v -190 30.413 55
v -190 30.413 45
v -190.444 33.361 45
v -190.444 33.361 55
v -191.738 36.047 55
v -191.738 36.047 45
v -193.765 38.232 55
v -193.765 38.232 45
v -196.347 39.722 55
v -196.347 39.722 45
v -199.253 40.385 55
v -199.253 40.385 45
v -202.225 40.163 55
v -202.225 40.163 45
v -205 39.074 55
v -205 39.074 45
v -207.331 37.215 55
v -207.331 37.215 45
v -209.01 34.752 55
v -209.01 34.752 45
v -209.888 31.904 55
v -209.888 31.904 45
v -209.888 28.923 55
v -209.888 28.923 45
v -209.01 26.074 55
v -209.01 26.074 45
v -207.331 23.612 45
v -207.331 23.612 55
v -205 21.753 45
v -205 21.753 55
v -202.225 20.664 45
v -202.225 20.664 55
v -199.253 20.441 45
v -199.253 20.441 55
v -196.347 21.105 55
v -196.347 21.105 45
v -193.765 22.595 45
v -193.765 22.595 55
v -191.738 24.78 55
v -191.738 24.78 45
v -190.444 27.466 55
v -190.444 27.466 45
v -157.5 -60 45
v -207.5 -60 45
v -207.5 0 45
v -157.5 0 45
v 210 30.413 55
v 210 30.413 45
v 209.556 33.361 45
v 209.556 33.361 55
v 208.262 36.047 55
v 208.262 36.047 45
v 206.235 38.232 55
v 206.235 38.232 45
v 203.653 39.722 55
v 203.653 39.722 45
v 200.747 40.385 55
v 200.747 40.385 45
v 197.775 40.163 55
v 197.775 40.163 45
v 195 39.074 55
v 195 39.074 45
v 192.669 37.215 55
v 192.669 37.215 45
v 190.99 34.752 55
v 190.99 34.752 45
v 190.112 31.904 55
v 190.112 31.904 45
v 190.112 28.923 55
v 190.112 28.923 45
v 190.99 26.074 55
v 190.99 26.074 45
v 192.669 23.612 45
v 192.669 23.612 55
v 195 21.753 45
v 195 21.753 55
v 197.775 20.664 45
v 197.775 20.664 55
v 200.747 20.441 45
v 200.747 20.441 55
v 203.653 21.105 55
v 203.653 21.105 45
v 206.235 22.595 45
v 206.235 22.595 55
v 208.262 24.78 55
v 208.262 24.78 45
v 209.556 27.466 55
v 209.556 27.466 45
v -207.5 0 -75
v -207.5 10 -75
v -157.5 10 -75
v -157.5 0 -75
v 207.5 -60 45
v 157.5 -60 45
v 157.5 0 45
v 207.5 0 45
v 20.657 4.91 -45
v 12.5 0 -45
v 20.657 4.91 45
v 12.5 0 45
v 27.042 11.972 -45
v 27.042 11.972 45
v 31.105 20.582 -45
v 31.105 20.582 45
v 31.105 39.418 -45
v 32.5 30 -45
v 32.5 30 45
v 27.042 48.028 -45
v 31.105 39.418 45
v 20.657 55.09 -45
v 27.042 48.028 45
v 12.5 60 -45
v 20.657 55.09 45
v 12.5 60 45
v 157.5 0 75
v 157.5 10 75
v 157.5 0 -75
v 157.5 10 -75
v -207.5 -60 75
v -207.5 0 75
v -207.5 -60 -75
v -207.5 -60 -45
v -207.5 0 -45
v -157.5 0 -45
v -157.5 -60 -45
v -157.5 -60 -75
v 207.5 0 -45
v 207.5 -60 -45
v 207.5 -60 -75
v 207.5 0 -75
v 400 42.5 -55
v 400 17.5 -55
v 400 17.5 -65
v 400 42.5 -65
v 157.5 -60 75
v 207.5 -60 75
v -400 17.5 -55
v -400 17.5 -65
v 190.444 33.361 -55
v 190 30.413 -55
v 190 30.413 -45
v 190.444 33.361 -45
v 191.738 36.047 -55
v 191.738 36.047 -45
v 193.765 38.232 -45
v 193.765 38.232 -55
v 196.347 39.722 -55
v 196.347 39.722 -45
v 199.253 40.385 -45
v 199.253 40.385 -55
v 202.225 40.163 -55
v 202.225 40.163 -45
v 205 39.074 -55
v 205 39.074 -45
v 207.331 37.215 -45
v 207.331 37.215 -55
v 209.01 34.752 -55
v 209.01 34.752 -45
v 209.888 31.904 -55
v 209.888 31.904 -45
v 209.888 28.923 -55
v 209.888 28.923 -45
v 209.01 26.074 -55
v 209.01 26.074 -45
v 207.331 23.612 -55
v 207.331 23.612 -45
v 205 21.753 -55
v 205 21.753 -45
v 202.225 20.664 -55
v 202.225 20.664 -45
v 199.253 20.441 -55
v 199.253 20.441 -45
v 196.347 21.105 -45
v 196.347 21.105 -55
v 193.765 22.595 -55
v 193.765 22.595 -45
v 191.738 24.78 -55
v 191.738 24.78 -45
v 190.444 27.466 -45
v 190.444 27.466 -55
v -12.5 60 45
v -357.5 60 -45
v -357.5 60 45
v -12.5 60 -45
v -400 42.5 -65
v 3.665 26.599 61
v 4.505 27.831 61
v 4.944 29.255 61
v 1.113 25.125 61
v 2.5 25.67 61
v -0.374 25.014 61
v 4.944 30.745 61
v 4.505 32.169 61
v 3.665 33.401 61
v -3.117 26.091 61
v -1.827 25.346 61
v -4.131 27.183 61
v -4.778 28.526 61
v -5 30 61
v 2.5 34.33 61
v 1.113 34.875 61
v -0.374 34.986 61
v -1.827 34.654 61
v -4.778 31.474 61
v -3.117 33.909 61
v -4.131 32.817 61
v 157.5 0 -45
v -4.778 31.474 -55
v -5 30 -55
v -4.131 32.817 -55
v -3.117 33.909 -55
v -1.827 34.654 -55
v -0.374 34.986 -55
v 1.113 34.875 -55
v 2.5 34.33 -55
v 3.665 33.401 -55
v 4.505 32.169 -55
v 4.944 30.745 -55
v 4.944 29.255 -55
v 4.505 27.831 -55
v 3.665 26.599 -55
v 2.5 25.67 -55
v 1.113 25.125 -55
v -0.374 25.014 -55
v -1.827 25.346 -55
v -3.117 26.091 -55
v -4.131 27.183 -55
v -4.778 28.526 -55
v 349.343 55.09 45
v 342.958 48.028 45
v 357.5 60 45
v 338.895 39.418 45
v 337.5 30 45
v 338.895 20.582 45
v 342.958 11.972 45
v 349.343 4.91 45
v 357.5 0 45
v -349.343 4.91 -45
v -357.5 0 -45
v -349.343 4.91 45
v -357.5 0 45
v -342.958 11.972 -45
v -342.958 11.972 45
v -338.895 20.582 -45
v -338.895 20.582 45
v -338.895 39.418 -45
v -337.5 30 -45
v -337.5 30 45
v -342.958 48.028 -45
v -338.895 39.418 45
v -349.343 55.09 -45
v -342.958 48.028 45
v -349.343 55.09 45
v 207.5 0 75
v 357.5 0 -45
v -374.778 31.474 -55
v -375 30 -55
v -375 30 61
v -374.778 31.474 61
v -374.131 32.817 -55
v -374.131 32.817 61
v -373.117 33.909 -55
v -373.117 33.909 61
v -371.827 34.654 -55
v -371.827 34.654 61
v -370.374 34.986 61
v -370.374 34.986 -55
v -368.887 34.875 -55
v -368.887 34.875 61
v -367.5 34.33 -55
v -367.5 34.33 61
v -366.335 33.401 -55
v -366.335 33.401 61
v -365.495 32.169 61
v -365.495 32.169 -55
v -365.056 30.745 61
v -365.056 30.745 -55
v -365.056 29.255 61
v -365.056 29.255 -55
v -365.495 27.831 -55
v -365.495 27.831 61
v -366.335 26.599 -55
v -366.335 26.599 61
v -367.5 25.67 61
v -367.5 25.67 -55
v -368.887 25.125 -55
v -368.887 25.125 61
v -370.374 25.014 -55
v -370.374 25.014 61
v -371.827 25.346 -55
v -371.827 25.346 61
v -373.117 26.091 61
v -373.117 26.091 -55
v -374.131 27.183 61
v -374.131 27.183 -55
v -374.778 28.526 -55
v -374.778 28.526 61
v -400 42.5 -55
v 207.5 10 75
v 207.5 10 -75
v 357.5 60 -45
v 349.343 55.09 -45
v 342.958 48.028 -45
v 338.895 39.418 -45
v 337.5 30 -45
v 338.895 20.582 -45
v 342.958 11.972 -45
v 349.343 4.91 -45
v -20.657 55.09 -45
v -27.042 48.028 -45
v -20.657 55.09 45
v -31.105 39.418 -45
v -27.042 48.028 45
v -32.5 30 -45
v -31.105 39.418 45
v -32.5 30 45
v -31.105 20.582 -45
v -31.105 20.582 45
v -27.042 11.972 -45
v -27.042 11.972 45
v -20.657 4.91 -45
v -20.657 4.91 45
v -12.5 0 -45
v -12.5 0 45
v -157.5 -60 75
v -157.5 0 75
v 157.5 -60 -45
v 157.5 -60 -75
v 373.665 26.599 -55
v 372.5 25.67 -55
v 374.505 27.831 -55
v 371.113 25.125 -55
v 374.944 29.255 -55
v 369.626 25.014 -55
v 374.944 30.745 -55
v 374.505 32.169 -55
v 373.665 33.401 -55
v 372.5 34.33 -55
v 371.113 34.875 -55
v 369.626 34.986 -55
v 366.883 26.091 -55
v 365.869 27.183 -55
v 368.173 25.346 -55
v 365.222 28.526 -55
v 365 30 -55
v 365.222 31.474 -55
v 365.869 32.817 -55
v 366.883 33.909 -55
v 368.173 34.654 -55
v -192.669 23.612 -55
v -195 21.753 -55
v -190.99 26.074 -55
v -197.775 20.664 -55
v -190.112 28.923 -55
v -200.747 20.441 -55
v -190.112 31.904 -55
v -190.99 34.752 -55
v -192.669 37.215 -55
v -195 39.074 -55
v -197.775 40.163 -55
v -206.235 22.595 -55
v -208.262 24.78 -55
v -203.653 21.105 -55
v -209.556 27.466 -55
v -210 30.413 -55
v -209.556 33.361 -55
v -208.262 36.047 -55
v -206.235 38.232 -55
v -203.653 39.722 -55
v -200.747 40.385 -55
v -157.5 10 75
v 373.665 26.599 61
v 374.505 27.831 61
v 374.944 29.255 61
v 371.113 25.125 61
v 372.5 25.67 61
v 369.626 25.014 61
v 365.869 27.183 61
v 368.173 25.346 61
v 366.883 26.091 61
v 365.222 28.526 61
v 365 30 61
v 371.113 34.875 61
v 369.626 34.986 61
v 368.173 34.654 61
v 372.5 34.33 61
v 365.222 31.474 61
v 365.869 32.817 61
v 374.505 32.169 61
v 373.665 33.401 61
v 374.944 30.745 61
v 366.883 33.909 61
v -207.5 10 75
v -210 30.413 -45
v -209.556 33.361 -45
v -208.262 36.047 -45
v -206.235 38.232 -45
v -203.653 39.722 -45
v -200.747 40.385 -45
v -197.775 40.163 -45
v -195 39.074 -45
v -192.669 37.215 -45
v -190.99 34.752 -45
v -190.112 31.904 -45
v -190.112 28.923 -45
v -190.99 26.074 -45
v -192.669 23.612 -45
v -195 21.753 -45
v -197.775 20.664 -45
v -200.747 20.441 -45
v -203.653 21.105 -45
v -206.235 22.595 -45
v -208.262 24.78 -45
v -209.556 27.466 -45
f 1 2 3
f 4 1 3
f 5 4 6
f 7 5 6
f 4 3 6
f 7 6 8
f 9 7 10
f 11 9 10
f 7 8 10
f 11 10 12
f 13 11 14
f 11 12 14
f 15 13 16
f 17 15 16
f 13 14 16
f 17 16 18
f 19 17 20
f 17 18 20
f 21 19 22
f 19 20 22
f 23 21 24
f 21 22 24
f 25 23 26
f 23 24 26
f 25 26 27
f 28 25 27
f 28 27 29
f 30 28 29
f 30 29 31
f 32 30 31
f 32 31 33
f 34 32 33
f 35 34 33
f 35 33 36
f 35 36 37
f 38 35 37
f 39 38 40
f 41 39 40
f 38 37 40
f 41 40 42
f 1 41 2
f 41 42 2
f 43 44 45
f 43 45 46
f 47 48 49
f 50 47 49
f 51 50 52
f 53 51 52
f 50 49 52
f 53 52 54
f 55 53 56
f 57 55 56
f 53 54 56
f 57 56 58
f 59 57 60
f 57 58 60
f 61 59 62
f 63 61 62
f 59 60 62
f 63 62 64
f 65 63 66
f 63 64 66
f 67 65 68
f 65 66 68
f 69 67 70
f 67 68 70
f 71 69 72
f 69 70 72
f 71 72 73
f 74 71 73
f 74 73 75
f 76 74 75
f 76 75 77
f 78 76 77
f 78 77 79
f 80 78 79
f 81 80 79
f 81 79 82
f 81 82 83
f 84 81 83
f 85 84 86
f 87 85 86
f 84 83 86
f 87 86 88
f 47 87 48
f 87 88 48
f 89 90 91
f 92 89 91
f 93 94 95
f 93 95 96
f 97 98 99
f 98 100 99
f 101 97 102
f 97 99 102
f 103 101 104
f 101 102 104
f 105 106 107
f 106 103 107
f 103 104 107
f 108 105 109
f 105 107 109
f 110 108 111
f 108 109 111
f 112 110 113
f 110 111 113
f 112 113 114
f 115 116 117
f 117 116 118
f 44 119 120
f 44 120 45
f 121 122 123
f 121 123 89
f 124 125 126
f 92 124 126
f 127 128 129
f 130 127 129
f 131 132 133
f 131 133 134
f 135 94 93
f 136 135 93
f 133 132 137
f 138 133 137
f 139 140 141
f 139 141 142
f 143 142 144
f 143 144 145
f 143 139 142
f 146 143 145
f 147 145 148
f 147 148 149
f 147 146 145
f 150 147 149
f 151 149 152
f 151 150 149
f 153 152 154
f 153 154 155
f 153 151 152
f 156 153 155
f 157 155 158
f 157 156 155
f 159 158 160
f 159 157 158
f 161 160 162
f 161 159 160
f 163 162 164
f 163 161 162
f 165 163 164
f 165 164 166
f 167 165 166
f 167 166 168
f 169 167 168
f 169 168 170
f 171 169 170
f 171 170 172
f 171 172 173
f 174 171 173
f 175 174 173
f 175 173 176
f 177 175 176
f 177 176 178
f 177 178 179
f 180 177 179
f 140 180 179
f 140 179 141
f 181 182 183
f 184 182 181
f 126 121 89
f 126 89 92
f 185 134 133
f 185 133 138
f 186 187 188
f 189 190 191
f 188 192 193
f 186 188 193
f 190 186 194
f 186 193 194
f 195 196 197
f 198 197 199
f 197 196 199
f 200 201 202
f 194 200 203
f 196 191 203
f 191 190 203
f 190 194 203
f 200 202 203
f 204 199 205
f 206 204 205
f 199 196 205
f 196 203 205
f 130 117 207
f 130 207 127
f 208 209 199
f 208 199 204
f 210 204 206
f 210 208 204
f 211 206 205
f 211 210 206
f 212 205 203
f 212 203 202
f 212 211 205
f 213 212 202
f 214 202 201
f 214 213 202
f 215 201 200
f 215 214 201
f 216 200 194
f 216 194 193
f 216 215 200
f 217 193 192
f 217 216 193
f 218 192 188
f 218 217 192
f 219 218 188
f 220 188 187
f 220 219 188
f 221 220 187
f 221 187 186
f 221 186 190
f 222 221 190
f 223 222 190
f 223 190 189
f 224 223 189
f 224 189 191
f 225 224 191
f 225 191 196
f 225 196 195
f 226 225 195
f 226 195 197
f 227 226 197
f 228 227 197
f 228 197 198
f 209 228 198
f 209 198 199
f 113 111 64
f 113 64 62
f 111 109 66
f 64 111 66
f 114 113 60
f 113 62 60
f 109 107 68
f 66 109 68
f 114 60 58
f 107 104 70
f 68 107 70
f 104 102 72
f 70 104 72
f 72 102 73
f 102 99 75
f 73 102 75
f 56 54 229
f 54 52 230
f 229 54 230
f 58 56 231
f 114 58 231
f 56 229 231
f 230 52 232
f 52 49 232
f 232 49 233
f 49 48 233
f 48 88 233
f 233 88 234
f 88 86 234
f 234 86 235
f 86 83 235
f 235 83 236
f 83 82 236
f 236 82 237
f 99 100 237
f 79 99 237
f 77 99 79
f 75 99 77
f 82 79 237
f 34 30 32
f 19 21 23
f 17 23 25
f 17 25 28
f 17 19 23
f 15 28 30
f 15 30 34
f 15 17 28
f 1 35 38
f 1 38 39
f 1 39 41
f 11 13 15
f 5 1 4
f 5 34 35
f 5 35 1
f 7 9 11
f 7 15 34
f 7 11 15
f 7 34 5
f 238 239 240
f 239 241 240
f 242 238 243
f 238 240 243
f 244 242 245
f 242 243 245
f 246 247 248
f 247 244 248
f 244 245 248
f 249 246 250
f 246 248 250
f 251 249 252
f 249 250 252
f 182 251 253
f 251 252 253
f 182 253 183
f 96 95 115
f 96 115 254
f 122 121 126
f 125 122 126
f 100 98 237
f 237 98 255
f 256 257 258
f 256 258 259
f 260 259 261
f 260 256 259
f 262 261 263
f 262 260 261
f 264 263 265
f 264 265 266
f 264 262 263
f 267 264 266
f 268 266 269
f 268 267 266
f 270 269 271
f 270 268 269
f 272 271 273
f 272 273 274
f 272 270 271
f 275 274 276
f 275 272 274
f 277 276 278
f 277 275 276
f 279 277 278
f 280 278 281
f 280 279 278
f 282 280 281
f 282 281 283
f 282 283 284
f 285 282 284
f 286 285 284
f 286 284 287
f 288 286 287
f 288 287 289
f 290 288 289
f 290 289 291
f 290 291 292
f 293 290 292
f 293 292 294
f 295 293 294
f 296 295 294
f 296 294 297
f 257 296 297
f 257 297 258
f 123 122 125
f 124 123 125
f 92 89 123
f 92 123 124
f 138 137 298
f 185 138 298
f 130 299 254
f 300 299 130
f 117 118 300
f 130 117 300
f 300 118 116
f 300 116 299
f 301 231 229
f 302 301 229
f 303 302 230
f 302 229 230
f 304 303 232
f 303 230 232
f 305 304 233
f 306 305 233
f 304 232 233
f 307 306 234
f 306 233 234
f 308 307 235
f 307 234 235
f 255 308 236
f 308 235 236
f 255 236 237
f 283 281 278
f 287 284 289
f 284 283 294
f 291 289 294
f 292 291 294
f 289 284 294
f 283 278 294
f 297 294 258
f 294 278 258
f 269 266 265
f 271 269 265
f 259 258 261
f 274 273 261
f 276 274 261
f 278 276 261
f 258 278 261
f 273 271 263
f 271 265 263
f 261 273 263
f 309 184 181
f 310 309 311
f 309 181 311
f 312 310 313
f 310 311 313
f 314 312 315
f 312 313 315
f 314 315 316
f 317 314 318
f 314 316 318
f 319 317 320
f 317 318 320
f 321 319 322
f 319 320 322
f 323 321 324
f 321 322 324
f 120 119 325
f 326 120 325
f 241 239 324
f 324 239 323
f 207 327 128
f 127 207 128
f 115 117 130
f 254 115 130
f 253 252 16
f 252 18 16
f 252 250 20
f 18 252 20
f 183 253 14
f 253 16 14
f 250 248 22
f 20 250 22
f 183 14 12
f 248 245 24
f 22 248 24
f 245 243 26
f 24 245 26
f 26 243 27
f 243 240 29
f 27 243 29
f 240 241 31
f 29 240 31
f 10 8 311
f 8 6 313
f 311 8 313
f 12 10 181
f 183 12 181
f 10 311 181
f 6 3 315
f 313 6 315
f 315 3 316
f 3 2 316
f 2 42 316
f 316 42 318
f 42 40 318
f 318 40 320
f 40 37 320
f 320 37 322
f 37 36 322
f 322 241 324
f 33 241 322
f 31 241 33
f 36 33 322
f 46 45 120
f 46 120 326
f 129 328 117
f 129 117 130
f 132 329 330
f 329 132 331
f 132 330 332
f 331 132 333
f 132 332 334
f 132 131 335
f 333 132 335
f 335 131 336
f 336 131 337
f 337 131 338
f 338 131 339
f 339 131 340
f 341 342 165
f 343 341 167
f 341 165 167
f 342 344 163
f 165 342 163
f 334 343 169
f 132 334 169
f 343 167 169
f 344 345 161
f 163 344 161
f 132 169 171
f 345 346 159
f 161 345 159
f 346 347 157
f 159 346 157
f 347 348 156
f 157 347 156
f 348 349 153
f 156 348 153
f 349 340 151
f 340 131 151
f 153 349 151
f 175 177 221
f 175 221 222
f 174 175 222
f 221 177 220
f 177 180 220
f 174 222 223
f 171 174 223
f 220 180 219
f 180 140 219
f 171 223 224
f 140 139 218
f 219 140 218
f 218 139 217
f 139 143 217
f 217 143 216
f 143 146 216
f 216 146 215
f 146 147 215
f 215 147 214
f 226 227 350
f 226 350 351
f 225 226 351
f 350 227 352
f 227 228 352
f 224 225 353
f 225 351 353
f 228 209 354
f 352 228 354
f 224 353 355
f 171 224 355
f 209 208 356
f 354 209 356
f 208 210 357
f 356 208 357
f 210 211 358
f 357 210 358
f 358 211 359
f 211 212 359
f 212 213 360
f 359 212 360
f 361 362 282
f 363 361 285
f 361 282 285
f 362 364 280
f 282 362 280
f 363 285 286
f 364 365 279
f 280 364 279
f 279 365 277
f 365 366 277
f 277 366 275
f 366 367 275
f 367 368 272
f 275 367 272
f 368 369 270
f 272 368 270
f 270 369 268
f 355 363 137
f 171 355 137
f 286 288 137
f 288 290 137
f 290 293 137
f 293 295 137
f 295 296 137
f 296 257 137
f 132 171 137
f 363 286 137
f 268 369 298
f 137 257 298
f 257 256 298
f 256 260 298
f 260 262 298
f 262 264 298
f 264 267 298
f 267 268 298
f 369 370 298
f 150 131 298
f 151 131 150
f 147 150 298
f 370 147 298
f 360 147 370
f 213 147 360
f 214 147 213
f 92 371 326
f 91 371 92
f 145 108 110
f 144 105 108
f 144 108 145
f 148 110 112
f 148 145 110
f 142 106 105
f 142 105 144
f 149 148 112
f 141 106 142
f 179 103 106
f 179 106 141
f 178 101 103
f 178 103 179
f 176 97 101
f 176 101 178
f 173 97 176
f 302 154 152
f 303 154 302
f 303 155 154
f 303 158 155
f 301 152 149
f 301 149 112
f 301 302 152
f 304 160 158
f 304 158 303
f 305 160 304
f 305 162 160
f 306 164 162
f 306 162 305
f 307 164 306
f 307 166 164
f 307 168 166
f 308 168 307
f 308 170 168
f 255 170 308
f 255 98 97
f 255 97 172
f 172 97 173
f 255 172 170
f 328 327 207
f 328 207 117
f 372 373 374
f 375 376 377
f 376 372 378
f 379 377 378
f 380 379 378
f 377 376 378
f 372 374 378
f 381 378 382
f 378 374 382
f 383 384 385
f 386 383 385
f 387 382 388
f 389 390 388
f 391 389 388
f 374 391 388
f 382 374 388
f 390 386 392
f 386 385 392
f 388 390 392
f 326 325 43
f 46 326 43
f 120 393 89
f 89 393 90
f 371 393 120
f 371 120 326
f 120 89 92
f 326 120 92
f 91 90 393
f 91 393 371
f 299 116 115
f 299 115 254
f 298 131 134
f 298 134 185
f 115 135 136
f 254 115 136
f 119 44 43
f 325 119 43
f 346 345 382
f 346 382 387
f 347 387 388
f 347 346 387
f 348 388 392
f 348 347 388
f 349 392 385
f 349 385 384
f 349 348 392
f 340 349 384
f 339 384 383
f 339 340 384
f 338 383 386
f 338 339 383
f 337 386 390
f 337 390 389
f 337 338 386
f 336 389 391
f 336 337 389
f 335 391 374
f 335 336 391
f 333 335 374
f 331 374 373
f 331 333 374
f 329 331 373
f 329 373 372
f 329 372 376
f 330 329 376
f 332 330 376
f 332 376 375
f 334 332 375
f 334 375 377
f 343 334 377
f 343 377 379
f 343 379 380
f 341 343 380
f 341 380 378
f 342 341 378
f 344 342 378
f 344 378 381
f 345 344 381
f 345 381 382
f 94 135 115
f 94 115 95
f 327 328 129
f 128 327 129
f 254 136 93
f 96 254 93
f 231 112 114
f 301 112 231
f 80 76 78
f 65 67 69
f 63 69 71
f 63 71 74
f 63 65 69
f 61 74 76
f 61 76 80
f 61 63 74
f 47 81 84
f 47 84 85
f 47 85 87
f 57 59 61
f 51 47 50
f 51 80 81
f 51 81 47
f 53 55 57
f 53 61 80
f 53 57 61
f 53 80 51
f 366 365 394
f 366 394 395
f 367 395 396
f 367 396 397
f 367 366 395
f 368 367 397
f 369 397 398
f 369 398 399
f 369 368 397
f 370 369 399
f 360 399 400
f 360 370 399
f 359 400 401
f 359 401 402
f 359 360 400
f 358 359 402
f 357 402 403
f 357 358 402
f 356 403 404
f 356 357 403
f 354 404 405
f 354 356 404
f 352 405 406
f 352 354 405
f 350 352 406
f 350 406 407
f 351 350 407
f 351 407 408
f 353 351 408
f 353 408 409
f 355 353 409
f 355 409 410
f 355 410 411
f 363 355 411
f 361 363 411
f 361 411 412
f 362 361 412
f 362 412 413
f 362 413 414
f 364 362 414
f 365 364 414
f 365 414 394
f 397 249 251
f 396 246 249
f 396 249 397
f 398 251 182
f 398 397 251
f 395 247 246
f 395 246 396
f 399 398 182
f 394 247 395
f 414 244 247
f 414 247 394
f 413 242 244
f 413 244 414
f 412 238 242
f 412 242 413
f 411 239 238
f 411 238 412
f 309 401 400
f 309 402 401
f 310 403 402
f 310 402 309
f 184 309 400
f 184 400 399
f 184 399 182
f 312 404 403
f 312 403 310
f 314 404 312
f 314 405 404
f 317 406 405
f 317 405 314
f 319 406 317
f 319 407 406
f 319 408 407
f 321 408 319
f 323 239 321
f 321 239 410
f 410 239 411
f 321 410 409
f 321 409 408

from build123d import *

# Parameters (mm, degrees)
SKETCH1_W             = 800
SKETCH1_H             = 90
BOSS_EXTRUDE1_DEPTH   = 60
SKETCH2_R             = 32.5
CUT_EXTRUDE1_DEPTH    = 110
SKETCH3_W             = 800
SKETCH3_H             = 25
BOSS_EXTRUDE2_DEPTH   = 10
SKETCH4_R             = 10
BOSS_EXTRUDE3_DEPTH   = 20
SKETCH5_R             = 5
BOSS_EXTRUDE5_DEPTH   = 126
SKETCH6_W             = 50
SKETCH6_H             = 150
BOSS_EXTRUDE6_DEPTH   = 10
BOSS_EXTRUDE6_2_DEPTH = 10
SKETCH8_W             = 50
SKETCH8_H             = 30
BOSS_EXTRUDE7_DEPTH   = 60
BOSS_EXTRUDE7_2_DEPTH = 60
BOSS_EXTRUDE7_3_DEPTH = 60
BOSS_EXTRUDE7_4_DEPTH = 60
SKETCH9_R             = 10
BOSS_EXTRUDE8_DEPTH   = 10
SKETCH11_W            = 38.25894648
SKETCH11_H            = 105.501943323
SKETCH11_W_2          = 34.499866654
SKETCH11_H_2          = 108.385350348
CUT_EXTRUDE3_DEPTH    = 100


with BuildPart() as part:
    # Sketch1 → Boss-Extrude1 (new body)
    with BuildSketch(Plane(origin=(0, 0, 0), x_dir=(1, 0, 0), z_dir=(0, 1, 0))):
        Rectangle(SKETCH1_W, SKETCH1_H)
    extrude(amount=BOSS_EXTRUDE1_DEPTH)

    # Sketch2 → Cut-Extrude1 (cut)
    with BuildSketch(Plane.XY.offset(45)):
        with Locations((370, 30)):
            Circle(SKETCH2_R)
        with Locations((-370, 30)):
            Circle(SKETCH2_R)
        with Locations((0, 30)):
            Circle(SKETCH2_R)
    extrude(amount=-CUT_EXTRUDE1_DEPTH, mode=Mode.SUBTRACT)



with BuildPart() as body_2:
    # Sketch3 → Boss-Extrude2 (new body)
    with BuildSketch(Plane(origin=(0, 0, -55), x_dir=(-1, 0, 0), z_dir=(0, 0, -1))):
        with Locations((0, 30)):
            Rectangle(SKETCH3_W, SKETCH3_H)
    extrude(amount=BOSS_EXTRUDE2_DEPTH)


with BuildPart() as part_1:
    add(part.part)

    add(body_2.part)  # Boss-Extrude3 merges body 2
    # Sketch4 → Boss-Extrude3 (add)
    with BuildSketch(Plane(origin=(0, 0, -55), x_dir=(-1, 0, 0), z_dir=(0, 0, -1))):
        with Locations((-200, 30.413322318)):
            Circle(SKETCH4_R)
        with Locations((200, 30.413322318)):
            Circle(SKETCH4_R)
    extrude(amount=-BOSS_EXTRUDE3_DEPTH)

    # Sketch5 → Boss-Extrude5 (add)
    with BuildSketch(Plane(origin=(0, 0, -65), x_dir=(-1, 0, 0), z_dir=(0, 0, -1))):
        with Locations((-370, 30)):
            Circle(SKETCH5_R)
        with Locations((0, 30)):
            Circle(SKETCH5_R)
        with Locations((370, 30)):
            Circle(SKETCH5_R)
    extrude(amount=-BOSS_EXTRUDE5_DEPTH)

    # Sketch9 → Boss-Extrude8 (add)
    with BuildSketch(Plane.XY.offset(45)):
        with Locations((-200, 30.413322318)):
            Circle(SKETCH9_R)
        with Locations((200, 30.413322318)):
            Circle(SKETCH9_R)
    extrude(amount=BOSS_EXTRUDE8_DEPTH)

    # Sketch11 → Cut-Extrude3 (cut)
    with BuildSketch(Plane(origin=(0, 0, 0), x_dir=(1, 0, 0), z_dir=(0, 1, 0))):
        with Locations((395.58737716, -0.634378686)):
            Rectangle(SKETCH11_W, SKETCH11_H)
        with Locations((-395.754238744, 0.807324826)):
            Rectangle(SKETCH11_W_2, SKETCH11_H_2)
    extrude(amount=CUT_EXTRUDE3_DEPTH, mode=Mode.SUBTRACT)


with BuildPart() as body_2_2:
    # Sketch6 → Boss-Extrude6 (new body)
    with BuildSketch(Plane(origin=(0, 10, 0), x_dir=(1, 0, 0), z_dir=(0, 1, 0))):
        with Locations((182.5, 0)):
            Rectangle(SKETCH6_W, SKETCH6_H)
    extrude(amount=-BOSS_EXTRUDE6_DEPTH)


with BuildPart() as body_3:
    # Sketch6 → Boss-Extrude6 2 (new body)
    with BuildSketch(Plane(origin=(0, 10, 0), x_dir=(1, 0, 0), z_dir=(0, 1, 0))):
        with Locations((-182.5, 0)):
            Rectangle(SKETCH6_W, SKETCH6_H)
    extrude(amount=-BOSS_EXTRUDE6_2_DEPTH)


with BuildPart() as body_4:
    # Sketch8 → Boss-Extrude7 (new body)
    with BuildSketch(Plane(origin=(0, 0, 0), x_dir=(1, 0, 0), z_dir=(0, 1, 0))):
        with Locations((-182.5, -60)):
            Rectangle(SKETCH8_W, SKETCH8_H)
    extrude(amount=-BOSS_EXTRUDE7_DEPTH)


with BuildPart() as body_5:
    # Sketch8 → Boss-Extrude7 2 (new body)
    with BuildSketch(Plane(origin=(0, 0, 0), x_dir=(1, 0, 0), z_dir=(0, 1, 0))):
        with Locations((-182.5, 60)):
            Rectangle(SKETCH8_W, SKETCH8_H)
    extrude(amount=-BOSS_EXTRUDE7_2_DEPTH)


with BuildPart() as body_6:
    # Sketch8 → Boss-Extrude7 3 (new body)
    with BuildSketch(Plane(origin=(0, 0, 0), x_dir=(1, 0, 0), z_dir=(0, 1, 0))):
        with Locations((182.5, 60)):
            Rectangle(SKETCH8_W, SKETCH8_H)
    extrude(amount=-BOSS_EXTRUDE7_3_DEPTH)


with BuildPart() as body_7:
    # Sketch8 → Boss-Extrude7 4 (new body)
    with BuildSketch(Plane(origin=(0, 0, 0), x_dir=(1, 0, 0), z_dir=(0, 1, 0))):
        with Locations((182.5, -60)):
            Rectangle(SKETCH8_W, SKETCH8_H)
    extrude(amount=-BOSS_EXTRUDE7_4_DEPTH)


solid = Compound([part_1.part, body_2_2.part, body_3.part, body_4.part, body_5.part, body_6.part, body_7.part])
